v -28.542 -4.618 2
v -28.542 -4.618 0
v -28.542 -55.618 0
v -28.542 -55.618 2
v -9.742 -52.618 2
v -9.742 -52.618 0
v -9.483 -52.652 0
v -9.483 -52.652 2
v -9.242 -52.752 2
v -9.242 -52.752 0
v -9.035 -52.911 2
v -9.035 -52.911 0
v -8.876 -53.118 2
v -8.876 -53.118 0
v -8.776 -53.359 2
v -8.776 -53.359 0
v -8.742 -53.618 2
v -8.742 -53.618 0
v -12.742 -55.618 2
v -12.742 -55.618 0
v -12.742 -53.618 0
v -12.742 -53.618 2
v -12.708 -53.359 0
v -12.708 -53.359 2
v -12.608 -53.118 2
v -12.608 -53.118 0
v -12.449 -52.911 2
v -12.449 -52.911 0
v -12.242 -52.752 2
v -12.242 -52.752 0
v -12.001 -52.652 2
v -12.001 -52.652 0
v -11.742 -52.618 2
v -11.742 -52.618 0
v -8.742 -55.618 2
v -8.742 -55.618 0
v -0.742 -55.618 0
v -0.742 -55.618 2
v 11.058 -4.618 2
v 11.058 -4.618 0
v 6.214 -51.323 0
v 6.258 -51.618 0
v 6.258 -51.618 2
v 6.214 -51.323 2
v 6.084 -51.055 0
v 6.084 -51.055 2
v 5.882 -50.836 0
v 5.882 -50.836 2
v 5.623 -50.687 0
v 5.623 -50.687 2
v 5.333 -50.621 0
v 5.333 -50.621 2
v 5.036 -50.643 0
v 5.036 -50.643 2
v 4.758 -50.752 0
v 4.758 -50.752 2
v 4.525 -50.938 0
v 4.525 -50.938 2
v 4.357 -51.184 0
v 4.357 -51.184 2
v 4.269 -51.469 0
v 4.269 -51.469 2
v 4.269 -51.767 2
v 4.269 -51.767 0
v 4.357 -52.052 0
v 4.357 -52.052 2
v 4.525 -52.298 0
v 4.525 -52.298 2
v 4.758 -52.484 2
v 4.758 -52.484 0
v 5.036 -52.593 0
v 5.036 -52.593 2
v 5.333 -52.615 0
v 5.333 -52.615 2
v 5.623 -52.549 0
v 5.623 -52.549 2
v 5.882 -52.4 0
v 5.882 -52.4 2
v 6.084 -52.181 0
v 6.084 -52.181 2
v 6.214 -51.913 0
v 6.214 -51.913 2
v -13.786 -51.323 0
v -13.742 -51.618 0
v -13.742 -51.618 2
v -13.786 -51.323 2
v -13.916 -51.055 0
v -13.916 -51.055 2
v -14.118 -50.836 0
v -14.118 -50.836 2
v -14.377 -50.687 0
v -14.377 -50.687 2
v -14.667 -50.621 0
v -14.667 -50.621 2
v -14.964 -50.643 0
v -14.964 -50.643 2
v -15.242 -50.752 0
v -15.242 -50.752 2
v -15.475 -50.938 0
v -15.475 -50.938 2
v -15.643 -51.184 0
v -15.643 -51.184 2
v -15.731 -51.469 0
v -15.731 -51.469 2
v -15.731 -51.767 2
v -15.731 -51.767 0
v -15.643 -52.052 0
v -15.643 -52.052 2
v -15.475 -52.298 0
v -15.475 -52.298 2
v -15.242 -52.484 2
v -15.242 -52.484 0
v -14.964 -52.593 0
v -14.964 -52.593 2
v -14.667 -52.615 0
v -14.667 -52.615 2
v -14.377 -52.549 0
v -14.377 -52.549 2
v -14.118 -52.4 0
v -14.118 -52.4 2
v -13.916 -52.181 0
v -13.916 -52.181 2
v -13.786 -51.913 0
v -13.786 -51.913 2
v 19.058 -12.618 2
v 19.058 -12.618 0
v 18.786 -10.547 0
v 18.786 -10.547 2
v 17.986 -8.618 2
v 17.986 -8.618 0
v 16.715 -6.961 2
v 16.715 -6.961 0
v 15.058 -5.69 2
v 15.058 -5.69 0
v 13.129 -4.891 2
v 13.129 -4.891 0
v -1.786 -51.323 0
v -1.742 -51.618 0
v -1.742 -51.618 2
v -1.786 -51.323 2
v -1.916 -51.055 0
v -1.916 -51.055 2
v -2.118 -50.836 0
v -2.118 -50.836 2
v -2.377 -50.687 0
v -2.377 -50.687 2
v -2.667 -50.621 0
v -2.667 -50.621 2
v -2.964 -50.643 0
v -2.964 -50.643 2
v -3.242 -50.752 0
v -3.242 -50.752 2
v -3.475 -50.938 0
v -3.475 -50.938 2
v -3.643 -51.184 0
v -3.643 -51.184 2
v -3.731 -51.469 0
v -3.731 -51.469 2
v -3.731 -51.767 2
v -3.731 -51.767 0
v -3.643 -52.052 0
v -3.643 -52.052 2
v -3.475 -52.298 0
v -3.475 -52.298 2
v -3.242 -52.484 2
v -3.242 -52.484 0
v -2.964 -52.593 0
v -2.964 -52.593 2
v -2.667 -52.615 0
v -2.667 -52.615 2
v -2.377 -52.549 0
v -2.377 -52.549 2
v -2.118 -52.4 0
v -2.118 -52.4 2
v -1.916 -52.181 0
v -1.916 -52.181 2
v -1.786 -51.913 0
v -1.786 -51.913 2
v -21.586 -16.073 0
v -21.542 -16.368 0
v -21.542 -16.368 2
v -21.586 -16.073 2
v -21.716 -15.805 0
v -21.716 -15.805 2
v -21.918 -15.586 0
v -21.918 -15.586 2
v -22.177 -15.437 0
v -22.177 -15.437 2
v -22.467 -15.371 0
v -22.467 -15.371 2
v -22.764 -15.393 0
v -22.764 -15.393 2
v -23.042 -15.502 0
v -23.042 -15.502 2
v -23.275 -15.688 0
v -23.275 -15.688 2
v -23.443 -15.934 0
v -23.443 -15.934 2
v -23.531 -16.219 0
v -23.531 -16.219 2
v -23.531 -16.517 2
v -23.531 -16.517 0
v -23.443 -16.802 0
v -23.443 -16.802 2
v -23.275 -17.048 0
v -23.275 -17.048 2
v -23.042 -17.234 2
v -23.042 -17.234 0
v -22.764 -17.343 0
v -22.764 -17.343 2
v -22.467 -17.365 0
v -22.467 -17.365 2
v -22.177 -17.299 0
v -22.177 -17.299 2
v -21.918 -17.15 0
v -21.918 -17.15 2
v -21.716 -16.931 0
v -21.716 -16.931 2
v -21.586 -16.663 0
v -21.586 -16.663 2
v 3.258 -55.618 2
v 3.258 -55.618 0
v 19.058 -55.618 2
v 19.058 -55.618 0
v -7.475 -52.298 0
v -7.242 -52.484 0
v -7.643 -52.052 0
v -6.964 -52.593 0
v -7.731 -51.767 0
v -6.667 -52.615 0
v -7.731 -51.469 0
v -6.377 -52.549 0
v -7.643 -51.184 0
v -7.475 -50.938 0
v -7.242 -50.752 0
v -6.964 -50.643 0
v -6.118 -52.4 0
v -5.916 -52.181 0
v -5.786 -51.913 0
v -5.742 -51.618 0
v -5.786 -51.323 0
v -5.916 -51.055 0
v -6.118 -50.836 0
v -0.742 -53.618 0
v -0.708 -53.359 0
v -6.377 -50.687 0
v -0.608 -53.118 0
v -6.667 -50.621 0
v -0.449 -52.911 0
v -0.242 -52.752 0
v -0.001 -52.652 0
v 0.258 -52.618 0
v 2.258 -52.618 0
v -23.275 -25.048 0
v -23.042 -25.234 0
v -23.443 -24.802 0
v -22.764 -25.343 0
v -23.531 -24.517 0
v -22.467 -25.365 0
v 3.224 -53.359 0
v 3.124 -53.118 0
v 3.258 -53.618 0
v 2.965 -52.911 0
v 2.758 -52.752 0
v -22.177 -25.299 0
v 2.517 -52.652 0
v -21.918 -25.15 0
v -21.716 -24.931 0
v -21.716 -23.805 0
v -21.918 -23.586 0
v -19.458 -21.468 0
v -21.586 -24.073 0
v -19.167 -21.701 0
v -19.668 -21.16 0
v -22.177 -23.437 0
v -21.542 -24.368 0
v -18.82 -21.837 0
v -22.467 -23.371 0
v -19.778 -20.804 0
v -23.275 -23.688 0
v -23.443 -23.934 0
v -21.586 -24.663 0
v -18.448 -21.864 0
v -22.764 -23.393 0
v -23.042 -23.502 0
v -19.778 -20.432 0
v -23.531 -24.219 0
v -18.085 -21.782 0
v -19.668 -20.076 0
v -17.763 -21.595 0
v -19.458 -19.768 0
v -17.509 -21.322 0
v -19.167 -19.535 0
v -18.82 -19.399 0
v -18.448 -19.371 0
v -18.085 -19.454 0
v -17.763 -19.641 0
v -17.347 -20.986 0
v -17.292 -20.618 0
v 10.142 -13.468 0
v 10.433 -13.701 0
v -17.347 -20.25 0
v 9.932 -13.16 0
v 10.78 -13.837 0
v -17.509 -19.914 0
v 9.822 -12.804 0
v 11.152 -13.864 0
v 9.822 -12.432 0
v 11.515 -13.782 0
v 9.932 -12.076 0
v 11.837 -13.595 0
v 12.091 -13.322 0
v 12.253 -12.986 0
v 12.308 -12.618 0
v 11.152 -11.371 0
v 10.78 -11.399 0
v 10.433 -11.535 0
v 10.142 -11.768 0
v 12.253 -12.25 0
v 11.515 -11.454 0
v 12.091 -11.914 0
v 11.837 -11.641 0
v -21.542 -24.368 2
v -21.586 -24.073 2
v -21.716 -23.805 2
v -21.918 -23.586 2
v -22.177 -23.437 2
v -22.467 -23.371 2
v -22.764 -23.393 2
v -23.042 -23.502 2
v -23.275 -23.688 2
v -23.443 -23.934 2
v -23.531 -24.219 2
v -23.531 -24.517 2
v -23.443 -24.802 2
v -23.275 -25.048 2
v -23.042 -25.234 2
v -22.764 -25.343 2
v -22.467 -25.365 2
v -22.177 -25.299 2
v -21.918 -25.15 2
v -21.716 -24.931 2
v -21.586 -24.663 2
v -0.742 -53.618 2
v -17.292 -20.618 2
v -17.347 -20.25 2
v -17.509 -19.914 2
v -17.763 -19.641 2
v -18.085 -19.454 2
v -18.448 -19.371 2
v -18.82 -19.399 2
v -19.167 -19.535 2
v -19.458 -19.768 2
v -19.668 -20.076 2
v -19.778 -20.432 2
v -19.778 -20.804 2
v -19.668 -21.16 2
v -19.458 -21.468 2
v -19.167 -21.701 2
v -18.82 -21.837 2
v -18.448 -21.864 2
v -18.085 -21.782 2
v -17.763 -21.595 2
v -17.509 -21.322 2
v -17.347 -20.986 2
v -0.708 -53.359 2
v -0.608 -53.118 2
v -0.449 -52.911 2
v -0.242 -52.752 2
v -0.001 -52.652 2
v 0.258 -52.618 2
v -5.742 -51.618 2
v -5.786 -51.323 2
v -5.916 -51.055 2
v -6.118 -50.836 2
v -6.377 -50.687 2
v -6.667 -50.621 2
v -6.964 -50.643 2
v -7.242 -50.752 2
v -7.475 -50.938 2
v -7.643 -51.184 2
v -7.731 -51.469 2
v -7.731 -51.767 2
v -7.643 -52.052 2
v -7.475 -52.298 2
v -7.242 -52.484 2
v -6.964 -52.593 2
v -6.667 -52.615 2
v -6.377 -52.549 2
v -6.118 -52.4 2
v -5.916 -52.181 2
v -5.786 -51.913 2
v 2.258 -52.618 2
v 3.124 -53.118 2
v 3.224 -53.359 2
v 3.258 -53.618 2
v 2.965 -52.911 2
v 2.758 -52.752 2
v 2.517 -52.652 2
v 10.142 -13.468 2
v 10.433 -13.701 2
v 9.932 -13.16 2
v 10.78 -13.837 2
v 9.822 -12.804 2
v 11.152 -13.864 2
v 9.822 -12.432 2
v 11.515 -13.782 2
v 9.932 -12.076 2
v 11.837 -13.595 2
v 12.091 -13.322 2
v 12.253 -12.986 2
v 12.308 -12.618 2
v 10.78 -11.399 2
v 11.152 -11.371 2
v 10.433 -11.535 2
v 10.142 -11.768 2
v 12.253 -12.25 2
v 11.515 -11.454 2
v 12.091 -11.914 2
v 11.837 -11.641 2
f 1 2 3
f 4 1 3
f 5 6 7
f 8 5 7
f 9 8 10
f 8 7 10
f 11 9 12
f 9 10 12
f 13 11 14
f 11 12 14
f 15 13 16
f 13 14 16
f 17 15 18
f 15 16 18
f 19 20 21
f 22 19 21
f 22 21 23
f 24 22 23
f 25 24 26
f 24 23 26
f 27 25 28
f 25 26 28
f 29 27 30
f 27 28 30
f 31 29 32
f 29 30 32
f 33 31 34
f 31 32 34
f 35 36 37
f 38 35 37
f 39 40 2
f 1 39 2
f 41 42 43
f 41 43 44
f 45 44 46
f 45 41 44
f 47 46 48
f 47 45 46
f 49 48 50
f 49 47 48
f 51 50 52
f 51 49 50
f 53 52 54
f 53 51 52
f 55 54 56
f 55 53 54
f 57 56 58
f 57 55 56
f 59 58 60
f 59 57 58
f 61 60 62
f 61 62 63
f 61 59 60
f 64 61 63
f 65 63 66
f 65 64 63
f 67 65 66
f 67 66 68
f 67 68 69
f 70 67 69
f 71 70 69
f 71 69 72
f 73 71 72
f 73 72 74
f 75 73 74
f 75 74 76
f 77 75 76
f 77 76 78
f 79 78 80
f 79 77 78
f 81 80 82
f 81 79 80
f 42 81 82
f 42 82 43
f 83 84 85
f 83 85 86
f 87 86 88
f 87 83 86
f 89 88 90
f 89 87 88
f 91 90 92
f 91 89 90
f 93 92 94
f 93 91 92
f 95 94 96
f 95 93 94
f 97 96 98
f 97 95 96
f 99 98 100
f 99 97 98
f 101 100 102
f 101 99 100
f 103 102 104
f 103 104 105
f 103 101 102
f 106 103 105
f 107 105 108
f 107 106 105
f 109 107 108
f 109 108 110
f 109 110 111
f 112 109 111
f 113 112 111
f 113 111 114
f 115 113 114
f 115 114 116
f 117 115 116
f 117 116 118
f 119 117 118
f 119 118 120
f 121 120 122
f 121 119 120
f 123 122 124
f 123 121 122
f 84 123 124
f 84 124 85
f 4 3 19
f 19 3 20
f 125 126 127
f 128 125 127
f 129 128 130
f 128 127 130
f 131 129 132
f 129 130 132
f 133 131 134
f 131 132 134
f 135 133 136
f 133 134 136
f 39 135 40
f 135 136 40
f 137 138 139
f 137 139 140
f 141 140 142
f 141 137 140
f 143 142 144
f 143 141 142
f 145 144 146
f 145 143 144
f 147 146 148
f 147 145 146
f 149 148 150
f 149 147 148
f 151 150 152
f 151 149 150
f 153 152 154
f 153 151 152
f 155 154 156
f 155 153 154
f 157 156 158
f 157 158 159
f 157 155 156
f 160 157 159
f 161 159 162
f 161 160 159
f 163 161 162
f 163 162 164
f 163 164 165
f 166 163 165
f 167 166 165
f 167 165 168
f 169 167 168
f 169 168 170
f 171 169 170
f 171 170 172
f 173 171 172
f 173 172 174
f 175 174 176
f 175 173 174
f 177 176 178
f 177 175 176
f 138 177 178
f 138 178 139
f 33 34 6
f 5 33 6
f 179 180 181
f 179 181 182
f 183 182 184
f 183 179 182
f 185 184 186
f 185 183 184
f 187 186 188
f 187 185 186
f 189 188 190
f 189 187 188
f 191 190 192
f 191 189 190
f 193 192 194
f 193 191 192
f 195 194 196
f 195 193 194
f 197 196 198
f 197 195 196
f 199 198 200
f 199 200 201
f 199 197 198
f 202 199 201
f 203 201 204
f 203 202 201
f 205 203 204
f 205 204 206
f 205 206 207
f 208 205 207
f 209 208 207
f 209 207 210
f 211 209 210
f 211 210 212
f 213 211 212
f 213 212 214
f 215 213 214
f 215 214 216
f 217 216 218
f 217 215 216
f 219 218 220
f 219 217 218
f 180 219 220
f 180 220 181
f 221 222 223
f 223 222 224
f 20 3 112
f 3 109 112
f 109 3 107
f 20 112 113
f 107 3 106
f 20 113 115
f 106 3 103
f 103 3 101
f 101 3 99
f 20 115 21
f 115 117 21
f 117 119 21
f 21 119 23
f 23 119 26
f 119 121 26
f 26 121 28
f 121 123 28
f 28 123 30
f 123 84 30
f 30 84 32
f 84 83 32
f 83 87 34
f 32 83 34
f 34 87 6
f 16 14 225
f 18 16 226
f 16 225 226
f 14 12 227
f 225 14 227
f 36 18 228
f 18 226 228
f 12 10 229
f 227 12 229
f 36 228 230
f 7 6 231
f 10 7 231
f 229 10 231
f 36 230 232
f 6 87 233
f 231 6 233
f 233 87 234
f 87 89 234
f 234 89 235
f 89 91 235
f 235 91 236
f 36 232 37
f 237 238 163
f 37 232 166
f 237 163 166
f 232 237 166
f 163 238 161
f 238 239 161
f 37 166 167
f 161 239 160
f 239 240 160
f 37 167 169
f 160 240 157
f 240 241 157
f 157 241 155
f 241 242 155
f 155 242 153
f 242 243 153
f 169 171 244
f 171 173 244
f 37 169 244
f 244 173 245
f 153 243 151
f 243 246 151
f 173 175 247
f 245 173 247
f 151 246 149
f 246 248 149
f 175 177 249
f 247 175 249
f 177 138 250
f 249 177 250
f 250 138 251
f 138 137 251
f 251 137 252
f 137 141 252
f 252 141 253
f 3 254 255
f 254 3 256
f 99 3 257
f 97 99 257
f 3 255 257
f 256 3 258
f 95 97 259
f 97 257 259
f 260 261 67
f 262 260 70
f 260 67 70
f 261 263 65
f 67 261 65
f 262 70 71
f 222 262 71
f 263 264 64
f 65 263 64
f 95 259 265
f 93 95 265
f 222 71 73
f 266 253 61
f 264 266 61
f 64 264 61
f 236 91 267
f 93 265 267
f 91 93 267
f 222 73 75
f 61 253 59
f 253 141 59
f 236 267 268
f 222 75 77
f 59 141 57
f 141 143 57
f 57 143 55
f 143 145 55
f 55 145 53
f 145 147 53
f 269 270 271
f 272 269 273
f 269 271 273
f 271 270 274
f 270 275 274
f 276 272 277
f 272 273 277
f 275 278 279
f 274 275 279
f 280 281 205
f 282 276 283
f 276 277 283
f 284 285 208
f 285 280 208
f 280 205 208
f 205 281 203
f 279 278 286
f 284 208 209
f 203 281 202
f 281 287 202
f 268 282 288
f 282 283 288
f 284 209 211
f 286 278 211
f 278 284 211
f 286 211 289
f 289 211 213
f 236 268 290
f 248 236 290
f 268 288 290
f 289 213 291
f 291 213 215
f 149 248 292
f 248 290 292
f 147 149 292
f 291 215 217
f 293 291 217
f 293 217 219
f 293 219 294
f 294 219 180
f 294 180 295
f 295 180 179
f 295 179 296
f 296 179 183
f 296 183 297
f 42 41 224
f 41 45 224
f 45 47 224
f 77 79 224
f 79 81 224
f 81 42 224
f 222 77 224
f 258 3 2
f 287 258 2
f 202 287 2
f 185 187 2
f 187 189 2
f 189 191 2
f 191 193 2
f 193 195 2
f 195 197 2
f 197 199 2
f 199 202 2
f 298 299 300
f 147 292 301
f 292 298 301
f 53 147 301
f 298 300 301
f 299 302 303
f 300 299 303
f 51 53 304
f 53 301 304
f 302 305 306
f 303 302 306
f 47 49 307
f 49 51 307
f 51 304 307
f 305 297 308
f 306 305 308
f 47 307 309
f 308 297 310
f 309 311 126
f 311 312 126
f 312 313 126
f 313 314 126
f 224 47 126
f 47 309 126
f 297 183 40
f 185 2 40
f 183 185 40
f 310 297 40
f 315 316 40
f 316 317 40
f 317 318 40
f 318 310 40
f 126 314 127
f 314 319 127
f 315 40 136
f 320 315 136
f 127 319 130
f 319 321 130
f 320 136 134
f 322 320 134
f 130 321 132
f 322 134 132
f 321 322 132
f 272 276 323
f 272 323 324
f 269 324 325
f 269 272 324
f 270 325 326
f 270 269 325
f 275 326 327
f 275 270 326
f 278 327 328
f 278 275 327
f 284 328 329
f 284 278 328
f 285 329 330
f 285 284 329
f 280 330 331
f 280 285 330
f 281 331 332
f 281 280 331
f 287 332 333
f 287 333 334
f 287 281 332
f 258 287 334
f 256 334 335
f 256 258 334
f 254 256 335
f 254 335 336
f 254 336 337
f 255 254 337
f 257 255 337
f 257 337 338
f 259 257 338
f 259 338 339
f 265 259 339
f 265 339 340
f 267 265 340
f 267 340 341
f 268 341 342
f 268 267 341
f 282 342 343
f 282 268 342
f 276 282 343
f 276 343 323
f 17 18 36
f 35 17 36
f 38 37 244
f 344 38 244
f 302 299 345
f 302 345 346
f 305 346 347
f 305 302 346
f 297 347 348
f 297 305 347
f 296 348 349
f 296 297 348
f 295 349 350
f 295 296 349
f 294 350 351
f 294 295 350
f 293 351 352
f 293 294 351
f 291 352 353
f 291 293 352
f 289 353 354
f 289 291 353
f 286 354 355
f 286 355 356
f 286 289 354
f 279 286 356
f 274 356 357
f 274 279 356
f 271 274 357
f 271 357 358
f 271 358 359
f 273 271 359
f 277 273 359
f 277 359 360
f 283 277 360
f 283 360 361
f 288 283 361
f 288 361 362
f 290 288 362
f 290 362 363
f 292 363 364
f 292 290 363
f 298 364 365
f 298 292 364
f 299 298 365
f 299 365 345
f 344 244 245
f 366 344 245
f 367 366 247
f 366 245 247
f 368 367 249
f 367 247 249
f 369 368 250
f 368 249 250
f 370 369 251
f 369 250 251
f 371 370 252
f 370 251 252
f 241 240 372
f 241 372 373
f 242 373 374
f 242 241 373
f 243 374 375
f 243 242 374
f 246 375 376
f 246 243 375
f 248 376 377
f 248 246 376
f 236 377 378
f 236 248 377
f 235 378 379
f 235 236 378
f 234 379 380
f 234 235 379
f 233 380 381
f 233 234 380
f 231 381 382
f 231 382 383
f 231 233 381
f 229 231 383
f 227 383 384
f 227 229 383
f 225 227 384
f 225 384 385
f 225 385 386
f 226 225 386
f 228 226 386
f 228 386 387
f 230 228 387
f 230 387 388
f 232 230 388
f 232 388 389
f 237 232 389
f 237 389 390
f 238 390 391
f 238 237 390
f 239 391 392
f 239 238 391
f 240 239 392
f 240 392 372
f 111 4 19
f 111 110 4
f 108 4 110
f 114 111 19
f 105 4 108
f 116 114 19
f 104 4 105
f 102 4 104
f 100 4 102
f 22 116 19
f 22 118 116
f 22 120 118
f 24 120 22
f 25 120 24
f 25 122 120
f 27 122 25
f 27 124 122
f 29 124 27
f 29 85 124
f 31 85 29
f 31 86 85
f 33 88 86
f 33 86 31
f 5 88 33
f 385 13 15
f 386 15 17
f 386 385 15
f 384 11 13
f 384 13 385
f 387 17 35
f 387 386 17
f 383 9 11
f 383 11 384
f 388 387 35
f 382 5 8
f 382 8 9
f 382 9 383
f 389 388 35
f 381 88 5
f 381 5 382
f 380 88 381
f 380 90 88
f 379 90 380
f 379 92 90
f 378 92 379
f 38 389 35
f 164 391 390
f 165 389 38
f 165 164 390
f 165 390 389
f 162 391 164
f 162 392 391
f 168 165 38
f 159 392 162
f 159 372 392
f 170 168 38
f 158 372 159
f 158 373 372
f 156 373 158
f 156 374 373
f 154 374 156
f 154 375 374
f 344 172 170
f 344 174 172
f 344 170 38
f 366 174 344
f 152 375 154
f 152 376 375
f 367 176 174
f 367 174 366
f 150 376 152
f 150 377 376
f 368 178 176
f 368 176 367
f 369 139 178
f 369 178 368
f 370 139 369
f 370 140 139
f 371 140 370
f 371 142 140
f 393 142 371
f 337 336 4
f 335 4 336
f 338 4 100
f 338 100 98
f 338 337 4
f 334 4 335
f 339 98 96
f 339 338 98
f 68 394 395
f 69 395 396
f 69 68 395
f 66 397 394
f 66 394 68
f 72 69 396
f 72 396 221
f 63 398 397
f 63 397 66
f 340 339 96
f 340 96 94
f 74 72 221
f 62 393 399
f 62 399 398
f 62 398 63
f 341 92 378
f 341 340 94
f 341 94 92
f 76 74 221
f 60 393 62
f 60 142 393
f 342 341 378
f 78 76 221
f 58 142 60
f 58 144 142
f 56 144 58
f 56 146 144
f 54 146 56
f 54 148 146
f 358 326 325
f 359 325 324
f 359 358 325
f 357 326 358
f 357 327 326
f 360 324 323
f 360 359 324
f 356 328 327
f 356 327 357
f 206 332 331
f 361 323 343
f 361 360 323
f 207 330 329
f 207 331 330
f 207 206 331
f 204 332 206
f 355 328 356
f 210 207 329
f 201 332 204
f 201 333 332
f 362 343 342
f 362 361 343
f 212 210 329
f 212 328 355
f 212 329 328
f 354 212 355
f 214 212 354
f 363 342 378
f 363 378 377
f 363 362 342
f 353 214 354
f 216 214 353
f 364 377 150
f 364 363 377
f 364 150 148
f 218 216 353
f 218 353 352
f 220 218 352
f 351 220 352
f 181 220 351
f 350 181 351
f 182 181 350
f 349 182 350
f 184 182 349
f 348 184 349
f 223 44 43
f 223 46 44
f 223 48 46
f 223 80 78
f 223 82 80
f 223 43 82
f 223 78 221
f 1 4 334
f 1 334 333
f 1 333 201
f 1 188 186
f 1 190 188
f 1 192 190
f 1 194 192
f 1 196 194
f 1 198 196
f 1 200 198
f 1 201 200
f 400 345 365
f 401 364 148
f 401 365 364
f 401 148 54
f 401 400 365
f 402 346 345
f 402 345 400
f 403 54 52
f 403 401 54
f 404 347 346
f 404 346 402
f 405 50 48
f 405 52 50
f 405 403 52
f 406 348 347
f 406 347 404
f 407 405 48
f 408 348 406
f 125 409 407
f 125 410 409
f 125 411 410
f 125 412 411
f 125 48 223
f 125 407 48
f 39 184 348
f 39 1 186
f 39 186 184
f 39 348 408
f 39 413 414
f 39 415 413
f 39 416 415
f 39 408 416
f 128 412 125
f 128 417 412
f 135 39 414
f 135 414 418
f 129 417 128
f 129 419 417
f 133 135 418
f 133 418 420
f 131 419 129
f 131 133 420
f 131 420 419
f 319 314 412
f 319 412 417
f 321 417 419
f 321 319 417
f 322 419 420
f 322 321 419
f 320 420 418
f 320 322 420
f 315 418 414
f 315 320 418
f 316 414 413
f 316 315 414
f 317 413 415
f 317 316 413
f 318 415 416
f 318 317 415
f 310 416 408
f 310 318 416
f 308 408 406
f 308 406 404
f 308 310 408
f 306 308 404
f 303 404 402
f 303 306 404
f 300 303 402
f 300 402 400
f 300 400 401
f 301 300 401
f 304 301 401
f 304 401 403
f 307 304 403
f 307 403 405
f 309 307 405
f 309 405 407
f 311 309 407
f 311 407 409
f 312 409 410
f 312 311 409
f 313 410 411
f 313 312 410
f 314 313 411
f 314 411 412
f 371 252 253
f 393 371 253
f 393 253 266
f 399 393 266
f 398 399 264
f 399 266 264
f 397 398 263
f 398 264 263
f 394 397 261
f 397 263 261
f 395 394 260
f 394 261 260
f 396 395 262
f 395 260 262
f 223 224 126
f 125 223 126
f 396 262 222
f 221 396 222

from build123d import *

# Parameters (mm, degrees)
SKETCH_1_R      = 1.25
SKETCH_1_R_2    = 1
EXTRUDE_2_DEPTH = 2


with BuildPart() as part:
    # 草圖1 → 填料-伸長2 (new body)
    with BuildSketch(Plane.XY):
        with BuildLine():
            Line((-28.541905067, -5.335177429), (-28.541905067, -52.335177429))
            Line((-28.541905067, -52.335177429), (-28.541905067, -53.6179941))
            Line((-28.541905067, -53.6179941), (-28.541905067, -55.6179941))
            Line((-28.541905067, -55.6179941), (-12.741905067, -55.6179941))
            Line((-12.741905067, -55.6179941), (-12.741905067, -53.6179941))
            ThreePointArc((-12.741905067, -53.6179941), (-12.449011848, -52.910887319), (-11.741905067, -52.6179941))
            Line((-11.741905067, -52.6179941), (-9.741905067, -52.6179941))
            ThreePointArc((-9.741905067, -52.6179941), (-9.034798286, -52.910887319), (-8.741905067, -53.6179941))
            Line((-8.741905067, -53.6179941), (-8.741905067, -55.6179941))
            Line((-8.741905067, -55.6179941), (-0.741905067, -55.6179941))
            Line((-0.741905067, -55.6179941), (-0.741905067, -53.6179941))
            ThreePointArc((-0.741905067, -53.6179941), (-0.449011848, -52.910887319), (0.258094933, -52.6179941))
            Line((0.258094933, -52.6179941), (2.258094933, -52.6179941))
            ThreePointArc((2.258094933, -52.6179941), (2.965201714, -52.910887319), (3.258094933, -53.6179941))
            Line((3.258094933, -53.6179941), (3.258094933, -55.6179941))
            Line((3.258094933, -55.6179941), (19.058094933, -55.6179941))
            Line((19.058094933, -55.6179941), (19.058094933, -53.900810772))
            Line((19.058094933, -53.900810772), (19.058094933, -52.6179941))
            Line((19.058094933, -52.6179941), (19.058094933, -12.6179941))
            ThreePointArc((19.058094933, -12.6179941), (16.714949182, -6.961139851), (11.058094933, -4.6179941))
            Line((11.058094933, -4.6179941), (-27.541905067, -4.6179941))
            Line((-27.541905067, -4.6179941), (-28.541905067, -4.6179941))
            Line((-28.541905067, -4.6179941), (-28.541905067, -5.335177429))
        make_face()
        with Locations((-18.541905067, -20.6179941)):
            Circle(SKETCH_1_R, mode=Mode.SUBTRACT)
        with Locations((-6.741905067, -51.6179941)):
            Circle(SKETCH_1_R_2, mode=Mode.SUBTRACT)
        with Locations((-22.541905067, -16.3679941)):
            Circle(SKETCH_1_R_2, mode=Mode.SUBTRACT)
        with Locations((-22.541905067, -24.3679941)):
            Circle(SKETCH_1_R_2, mode=Mode.SUBTRACT)
        with Locations((11.058094933, -12.6179941)):
            Circle(SKETCH_1_R, mode=Mode.SUBTRACT)
        with Locations((-14.741905067, -51.6179941)):
            Circle(SKETCH_1_R_2, mode=Mode.SUBTRACT)
        with Locations((5.258094933, -51.6179941)):
            Circle(SKETCH_1_R_2, mode=Mode.SUBTRACT)
        with Locations((-2.741905067, -51.6179941)):
            Circle(SKETCH_1_R_2, mode=Mode.SUBTRACT)
    extrude(amount=EXTRUDE_2_DEPTH)


solid = part.part
